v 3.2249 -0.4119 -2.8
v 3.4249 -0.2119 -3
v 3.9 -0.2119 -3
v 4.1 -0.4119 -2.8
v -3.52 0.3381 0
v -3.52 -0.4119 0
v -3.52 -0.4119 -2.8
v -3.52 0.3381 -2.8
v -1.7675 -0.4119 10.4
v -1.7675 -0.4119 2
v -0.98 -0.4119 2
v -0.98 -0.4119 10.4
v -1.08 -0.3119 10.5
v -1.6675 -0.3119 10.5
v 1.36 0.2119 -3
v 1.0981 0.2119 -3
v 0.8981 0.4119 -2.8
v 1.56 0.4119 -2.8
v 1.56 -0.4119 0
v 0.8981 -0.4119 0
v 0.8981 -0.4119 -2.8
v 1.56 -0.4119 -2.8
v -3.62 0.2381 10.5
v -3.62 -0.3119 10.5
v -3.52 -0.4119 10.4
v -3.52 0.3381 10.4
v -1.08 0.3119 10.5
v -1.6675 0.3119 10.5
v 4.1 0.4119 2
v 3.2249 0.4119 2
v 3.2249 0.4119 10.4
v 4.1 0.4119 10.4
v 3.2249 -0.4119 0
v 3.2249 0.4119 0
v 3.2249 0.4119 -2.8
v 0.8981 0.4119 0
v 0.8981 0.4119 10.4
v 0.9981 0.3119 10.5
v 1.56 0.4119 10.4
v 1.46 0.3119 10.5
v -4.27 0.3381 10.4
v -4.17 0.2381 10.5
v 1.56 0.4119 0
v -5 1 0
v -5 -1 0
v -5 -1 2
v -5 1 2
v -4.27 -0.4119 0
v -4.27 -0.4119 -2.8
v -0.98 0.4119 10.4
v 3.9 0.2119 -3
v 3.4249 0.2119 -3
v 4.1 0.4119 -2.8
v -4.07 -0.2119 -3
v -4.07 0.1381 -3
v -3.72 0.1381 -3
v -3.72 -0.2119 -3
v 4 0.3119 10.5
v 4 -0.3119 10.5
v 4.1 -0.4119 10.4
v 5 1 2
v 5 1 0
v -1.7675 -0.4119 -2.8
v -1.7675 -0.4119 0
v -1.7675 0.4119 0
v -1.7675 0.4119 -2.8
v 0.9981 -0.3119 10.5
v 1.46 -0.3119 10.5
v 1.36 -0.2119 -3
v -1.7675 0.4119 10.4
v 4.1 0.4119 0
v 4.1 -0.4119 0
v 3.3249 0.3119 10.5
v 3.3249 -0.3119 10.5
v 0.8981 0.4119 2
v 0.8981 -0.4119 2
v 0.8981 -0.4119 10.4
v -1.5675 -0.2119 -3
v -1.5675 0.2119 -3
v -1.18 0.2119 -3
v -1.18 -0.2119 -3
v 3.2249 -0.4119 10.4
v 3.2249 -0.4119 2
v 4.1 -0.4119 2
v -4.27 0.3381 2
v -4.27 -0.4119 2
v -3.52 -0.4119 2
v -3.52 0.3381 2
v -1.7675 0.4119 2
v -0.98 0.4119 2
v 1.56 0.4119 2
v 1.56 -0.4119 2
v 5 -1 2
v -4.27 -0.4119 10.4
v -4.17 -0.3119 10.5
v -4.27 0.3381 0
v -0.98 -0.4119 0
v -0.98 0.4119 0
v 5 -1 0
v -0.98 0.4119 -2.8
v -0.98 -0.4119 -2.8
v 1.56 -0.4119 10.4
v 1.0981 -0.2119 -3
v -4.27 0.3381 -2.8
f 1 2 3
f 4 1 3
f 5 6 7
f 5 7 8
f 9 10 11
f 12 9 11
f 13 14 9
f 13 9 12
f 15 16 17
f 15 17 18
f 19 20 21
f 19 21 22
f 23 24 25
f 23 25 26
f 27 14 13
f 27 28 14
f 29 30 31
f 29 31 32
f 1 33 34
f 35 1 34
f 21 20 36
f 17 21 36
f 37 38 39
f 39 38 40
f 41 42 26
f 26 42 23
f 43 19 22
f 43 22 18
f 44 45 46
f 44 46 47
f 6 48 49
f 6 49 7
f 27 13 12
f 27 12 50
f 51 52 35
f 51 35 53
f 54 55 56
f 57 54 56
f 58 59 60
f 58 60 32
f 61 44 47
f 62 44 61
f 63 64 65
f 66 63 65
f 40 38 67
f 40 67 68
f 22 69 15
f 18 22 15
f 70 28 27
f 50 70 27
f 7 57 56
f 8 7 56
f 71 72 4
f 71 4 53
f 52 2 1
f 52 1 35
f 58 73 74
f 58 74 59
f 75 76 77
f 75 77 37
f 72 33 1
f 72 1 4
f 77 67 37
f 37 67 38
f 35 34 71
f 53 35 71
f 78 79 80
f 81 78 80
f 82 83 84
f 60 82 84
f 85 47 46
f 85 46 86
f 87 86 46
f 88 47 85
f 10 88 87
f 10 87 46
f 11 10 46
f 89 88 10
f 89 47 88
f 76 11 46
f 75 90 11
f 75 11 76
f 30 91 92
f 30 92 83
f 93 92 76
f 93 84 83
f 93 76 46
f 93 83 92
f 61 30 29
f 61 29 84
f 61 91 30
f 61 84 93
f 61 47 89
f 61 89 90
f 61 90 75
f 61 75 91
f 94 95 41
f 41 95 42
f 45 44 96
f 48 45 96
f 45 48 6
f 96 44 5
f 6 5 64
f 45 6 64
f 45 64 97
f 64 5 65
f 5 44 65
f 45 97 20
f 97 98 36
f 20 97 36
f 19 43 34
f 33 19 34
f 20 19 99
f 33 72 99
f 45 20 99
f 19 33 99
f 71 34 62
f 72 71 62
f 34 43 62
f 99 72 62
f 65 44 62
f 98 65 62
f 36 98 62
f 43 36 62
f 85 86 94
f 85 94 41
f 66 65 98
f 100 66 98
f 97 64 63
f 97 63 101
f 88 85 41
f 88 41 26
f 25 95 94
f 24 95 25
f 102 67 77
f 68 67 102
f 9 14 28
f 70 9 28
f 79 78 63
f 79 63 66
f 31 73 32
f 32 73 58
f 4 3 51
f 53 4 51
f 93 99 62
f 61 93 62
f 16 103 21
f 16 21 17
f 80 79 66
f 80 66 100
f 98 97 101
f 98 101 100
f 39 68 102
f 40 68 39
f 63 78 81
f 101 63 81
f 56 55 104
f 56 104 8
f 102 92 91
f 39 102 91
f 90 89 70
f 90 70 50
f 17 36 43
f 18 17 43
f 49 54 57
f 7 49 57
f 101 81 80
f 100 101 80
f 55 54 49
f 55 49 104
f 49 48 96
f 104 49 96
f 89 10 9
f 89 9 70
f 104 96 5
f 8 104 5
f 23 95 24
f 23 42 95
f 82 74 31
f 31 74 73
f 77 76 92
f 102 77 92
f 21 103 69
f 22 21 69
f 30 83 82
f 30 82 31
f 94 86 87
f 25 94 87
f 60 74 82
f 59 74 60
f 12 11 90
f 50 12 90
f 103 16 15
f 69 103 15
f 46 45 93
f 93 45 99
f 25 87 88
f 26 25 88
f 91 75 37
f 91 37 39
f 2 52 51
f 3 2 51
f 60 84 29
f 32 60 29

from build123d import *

# Parameters (mm, degrees)
F0_W          = 10
F0_H          = 2
F1_DEPTH      = 2
F2_W          = 0.75
F2_H          = 0.75
F2_W_2        = 0.787472
F2_H_2        = 0.823894
F2_W_3        = 0.66187
F2_W_4        = 0.875056
F3_DEPTH      = 8.5
F3_DEPTH_BACK = 5
F4_SIZE       = 0.1
F5_SIZE       = 0.1
F6_SIZE       = 0.1
F7_SIZE       = 0.1
F8_SIZE       = 0.2


with BuildPart() as f1:
    # F0 (on Top) → F1 (new body)
    with BuildSketch(Plane.XY):
        Rectangle(F0_W, F0_H)
    extrude(amount=F1_DEPTH)

    # F2 (on face) → F3 (join, two sides)
    with BuildSketch(Plane.XY.offset(2)) as f3_sk:
        with Locations((-3.895019, -0.036947)):
            Rectangle(F2_W, F2_H)
        with Locations((-1.373755, 0)):
            Rectangle(F2_W_2, F2_H_2)
        with Locations((1.229046, 0)):
            Rectangle(F2_W_3, F2_H_2)
        with Locations((3.662453, 0)):
            Rectangle(F2_W_4, F2_H_2)
    extrude(amount=F3_DEPTH)
    extrude(f3_sk.sketch, amount=-F3_DEPTH_BACK)

    # F4
    f4_edges = [f1.edges().sort_by_distance(p)[0] for p in [
        (-3.895019, -0.411947, 10.5),
        (-3.520019, -0.036947, 10.5),
        (-3.895019, 0.338053, 10.5),
        (-4.270019, -0.036947, 10.5),
    ]]
    chamfer(f4_edges, length=F4_SIZE)

    # F5
    f5_edges = [f1.edges().sort_by_distance(p)[0] for p in [
        (-1.373755, -0.411947, 10.5),
        (-0.980019, 0, 10.5),
        (-1.373755, 0.411947, 10.5),
        (-1.767491, 0, 10.5),
    ]]
    chamfer(f5_edges, length=F5_SIZE)

    # F6
    f6_edges = [f1.edges().sort_by_distance(p)[0] for p in [
        (0.898111, 0, 10.5),
        (1.229046, -0.411947, 10.5),
        (1.559981, 0, 10.5),
        (1.229046, 0.411947, 10.5),
    ]]
    chamfer(f6_edges, length=F6_SIZE)

    # F7
    f7_edges = [f1.edges().sort_by_distance(p)[0] for p in [
        (3.224925, 0, 10.5),
        (3.662453, -0.411947, 10.5),
        (4.099981, 0, 10.5),
        (3.662453, 0.411947, 10.5),
    ]]
    chamfer(f7_edges, length=F7_SIZE)

    # F8
    f8_edges = [f1.edges().sort_by_distance(p)[0] for p in [
        (3.224925, 0, -3),
        (3.662453, -0.411947, -3),
        (4.099981, 0, -3),
        (3.662453, 0.411947, -3),
        (0.898111, 0, -3),
        (1.229046, -0.411947, -3),
        (1.559981, 0, -3),
        (1.229046, 0.411947, -3),
        (-1.373755, 0.411947, -3),
        (-1.767491, 0, -3),
        (-1.373755, -0.411947, -3),
        (-0.980019, 0, -3),
        (-3.520019, -0.036947, -3),
        (-3.895019, 0.338053, -3),
        (-4.270019, -0.036947, -3),
        (-3.895019, -0.411947, -3),
    ]]
    chamfer(f8_edges, length=F8_SIZE)


solid = f1.part
